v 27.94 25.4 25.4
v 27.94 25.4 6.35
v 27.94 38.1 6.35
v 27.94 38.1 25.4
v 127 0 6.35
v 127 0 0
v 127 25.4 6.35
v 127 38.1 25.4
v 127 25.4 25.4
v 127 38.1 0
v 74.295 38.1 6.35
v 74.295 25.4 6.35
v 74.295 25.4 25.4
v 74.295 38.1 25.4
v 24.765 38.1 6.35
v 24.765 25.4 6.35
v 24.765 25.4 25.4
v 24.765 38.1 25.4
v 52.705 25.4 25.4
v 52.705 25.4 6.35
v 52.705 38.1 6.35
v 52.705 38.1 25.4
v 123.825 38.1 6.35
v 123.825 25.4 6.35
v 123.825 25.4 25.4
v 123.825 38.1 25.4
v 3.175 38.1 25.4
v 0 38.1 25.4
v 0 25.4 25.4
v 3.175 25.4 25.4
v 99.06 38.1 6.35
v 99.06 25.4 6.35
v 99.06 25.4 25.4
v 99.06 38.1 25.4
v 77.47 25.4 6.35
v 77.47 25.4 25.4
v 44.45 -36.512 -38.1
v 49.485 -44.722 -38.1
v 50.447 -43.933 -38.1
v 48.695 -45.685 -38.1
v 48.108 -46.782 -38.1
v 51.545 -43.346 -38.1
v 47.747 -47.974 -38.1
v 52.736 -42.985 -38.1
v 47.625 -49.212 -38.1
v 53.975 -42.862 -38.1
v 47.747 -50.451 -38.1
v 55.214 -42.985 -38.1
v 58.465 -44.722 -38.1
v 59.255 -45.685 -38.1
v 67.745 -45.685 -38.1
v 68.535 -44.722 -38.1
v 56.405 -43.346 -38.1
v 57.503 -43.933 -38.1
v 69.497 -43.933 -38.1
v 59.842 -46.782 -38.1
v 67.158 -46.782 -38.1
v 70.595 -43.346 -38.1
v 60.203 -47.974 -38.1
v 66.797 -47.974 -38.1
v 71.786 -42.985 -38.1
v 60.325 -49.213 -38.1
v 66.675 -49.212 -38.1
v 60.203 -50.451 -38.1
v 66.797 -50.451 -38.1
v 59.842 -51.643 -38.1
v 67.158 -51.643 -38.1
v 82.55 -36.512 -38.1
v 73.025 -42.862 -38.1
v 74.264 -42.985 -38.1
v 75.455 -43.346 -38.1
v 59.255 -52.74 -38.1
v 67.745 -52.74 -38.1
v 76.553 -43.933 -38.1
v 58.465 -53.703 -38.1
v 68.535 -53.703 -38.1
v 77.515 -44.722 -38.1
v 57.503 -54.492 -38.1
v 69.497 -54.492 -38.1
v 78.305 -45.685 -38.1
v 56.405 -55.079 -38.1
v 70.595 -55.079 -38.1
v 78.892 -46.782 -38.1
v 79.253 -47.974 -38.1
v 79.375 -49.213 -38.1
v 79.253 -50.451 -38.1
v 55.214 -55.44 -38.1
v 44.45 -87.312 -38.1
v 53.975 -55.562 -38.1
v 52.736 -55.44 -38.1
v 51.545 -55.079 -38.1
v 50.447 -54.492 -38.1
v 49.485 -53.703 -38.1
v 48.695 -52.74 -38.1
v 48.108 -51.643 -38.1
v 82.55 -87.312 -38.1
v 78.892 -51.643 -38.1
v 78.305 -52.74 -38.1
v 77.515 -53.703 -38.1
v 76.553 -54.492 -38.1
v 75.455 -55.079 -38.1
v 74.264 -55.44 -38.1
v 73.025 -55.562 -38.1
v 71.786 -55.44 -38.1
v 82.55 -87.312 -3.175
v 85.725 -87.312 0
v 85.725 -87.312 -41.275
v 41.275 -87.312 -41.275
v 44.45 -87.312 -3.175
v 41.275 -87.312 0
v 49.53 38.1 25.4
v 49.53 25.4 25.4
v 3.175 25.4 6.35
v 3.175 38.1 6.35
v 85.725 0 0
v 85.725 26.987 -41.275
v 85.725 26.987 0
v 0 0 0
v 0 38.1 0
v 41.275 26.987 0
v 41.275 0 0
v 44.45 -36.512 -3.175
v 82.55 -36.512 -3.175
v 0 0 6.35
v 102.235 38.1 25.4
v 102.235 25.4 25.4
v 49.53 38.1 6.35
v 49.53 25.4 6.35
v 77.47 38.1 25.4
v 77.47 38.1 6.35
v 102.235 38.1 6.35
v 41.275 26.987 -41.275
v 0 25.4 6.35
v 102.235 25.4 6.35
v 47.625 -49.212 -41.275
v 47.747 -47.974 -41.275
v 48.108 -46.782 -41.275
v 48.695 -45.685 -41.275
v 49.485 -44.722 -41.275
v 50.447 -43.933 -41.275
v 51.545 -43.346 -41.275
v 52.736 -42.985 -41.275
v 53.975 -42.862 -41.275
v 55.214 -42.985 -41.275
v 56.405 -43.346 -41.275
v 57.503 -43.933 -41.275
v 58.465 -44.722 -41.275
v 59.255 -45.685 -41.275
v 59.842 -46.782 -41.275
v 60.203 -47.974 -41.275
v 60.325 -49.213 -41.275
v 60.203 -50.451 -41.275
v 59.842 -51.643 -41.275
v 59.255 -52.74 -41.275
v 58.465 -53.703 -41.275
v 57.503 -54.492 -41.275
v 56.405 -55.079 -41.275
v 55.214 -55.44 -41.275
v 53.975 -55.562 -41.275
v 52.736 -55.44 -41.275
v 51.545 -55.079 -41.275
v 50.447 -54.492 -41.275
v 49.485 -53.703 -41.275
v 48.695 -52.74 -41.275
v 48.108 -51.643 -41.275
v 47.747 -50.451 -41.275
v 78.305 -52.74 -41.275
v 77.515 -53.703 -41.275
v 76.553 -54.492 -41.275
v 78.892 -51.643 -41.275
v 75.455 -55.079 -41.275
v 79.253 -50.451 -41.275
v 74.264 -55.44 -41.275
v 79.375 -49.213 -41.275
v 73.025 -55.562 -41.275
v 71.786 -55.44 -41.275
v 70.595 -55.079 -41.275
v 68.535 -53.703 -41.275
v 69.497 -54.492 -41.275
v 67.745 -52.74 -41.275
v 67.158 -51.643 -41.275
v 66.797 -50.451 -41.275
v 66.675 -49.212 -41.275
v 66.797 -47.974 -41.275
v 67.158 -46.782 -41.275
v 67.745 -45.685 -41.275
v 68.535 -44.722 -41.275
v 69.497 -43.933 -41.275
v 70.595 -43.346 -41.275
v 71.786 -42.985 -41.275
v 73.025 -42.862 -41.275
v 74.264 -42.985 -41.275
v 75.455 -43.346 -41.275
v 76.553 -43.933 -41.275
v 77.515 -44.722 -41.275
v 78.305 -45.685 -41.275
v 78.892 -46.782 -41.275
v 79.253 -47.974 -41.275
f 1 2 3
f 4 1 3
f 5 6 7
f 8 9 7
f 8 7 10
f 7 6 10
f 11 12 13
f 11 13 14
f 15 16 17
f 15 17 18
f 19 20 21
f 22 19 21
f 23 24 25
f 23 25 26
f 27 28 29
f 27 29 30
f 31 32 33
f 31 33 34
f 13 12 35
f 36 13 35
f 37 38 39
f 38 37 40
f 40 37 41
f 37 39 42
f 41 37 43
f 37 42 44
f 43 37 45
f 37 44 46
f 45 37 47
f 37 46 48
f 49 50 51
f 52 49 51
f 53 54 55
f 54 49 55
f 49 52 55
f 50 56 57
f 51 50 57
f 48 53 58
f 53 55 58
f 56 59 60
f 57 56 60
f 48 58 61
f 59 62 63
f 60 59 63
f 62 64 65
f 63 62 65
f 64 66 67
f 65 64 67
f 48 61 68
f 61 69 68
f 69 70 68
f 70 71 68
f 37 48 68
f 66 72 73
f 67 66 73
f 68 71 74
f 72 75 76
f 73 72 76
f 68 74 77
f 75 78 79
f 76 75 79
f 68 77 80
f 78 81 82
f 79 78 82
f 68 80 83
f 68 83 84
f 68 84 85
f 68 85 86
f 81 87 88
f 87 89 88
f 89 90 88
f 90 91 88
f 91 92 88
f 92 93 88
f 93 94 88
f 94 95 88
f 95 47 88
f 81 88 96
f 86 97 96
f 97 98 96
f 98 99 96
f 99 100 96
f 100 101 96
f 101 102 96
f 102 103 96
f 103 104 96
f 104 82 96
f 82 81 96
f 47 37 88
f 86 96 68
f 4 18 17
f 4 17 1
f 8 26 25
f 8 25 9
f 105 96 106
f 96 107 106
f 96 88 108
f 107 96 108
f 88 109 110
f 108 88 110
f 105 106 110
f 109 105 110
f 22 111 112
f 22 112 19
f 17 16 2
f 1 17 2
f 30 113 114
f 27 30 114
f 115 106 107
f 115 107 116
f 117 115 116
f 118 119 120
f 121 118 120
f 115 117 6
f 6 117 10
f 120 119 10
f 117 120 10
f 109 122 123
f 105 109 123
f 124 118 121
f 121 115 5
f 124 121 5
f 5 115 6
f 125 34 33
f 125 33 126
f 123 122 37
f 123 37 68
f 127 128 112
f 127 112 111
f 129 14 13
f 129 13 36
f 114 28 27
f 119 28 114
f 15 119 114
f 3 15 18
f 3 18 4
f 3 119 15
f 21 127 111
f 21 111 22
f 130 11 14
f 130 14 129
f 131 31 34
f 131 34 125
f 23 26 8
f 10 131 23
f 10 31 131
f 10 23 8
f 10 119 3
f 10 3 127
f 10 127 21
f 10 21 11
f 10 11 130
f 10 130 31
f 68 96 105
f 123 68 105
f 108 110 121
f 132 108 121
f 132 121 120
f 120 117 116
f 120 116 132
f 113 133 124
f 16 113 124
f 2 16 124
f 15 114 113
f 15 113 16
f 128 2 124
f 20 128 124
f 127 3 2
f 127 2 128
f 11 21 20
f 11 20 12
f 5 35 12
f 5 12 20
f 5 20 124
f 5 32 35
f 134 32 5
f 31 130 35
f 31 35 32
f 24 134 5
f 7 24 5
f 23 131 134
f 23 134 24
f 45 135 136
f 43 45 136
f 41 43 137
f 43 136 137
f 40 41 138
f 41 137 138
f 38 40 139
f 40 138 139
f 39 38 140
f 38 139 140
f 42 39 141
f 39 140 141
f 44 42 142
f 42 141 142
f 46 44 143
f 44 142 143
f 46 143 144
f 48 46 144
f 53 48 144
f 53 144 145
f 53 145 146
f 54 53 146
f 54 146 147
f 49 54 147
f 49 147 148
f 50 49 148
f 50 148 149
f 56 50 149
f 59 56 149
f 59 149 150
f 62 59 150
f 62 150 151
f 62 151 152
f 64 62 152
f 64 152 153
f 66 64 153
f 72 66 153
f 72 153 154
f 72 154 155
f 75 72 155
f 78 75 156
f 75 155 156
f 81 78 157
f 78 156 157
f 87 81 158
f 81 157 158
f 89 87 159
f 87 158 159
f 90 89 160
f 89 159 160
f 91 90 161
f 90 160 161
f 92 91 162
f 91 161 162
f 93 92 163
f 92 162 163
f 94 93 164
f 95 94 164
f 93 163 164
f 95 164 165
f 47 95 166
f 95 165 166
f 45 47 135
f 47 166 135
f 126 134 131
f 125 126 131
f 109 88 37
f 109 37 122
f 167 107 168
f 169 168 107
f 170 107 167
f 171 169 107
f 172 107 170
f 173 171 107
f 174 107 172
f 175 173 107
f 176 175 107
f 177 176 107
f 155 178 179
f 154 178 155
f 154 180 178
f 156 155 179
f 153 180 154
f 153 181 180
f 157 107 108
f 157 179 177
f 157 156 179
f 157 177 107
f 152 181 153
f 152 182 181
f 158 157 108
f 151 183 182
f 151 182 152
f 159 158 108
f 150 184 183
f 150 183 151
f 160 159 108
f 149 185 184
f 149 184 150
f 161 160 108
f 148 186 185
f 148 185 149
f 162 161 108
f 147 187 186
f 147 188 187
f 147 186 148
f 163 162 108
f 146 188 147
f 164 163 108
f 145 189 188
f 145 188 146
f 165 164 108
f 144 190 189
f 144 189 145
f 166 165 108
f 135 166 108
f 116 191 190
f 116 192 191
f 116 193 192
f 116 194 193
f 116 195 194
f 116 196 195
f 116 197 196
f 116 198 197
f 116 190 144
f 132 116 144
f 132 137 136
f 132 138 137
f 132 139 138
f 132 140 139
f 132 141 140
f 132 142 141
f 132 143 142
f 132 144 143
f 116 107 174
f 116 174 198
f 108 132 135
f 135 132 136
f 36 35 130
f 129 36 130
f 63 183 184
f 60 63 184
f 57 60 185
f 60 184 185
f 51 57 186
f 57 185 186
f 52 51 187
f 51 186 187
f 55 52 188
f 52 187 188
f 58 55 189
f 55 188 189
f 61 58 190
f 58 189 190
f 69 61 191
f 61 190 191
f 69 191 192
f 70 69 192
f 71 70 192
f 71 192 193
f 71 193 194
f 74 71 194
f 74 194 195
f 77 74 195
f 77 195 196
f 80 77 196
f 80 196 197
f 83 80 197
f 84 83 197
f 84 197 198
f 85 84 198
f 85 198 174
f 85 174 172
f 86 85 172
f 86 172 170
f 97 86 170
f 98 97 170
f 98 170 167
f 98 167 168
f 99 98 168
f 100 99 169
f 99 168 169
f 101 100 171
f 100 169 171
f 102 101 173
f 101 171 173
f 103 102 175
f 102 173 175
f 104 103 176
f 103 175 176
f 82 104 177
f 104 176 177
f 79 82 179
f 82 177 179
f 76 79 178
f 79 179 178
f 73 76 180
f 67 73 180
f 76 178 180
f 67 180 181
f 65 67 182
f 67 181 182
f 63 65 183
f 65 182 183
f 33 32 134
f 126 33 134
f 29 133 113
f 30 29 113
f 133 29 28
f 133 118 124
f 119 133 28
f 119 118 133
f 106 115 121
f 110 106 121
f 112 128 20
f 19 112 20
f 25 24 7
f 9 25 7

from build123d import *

# Parameters (mm, degrees)
SKETCH1_W           = 127
SKETCH1_H           = 38.1
BOSS_EXTRUDE1_DEPTH = 6.35
SKETCH2_W           = 3.175
SKETCH2_H           = 12.7
BOSS_EXTRUDE2_DEPTH = 19.05
SKETCH3_W           = 44.45
SKETCH3_H           = 114.3
BOSS_EXTRUDE3_DEPTH = 41.275
SKETCH4_W           = 38.1
SKETCH4_H           = 34.925
CUT_EXTRUDE1_DEPTH  = 50.8
SKETCH5_R           = 6.35
CUT_EXTRUDE2_DEPTH  = 23.8125


with BuildPart() as part:
    # Sketch1 → Boss-Extrude1 (new body)
    with BuildSketch(Plane.XY):
        with Locations((63.5, 19.05)):
            Rectangle(SKETCH1_W, SKETCH1_H)
    extrude(amount=BOSS_EXTRUDE1_DEPTH)

    # Sketch2 → Boss-Extrude2 (add)
    with BuildSketch(Plane.XY.offset(6.35)):
        with Locations((26.3525, 31.75)):
            Rectangle(SKETCH2_W, SKETCH2_H)
        with Locations((1.5875, 31.75)):
            Rectangle(SKETCH2_W, SKETCH2_H)
        with Locations((51.1175, 31.75)):
            Rectangle(SKETCH2_W, SKETCH2_H)
        with Locations((75.8825, 31.75)):
            Rectangle(SKETCH2_W, SKETCH2_H)
        with Locations((100.6475, 31.75)):
            Rectangle(SKETCH2_W, SKETCH2_H)
        with Locations((125.4125, 31.75)):
            Rectangle(SKETCH2_W, SKETCH2_H)
    extrude(amount=BOSS_EXTRUDE2_DEPTH)

    # Sketch3 → Boss-Extrude3 (add)
    with BuildSketch(Plane(origin=(0, 0, 0), x_dir=(-1, 0, 0), z_dir=(0, 0, -1))):
        with Locations((-63.5, -30.1625)):
            Rectangle(SKETCH3_W, SKETCH3_H)
    extrude(amount=BOSS_EXTRUDE3_DEPTH)

    # Sketch4 → Cut-Extrude1 (cut)
    with BuildSketch(Plane.XZ.offset(87.3125)):
        with Locations((63.5, -20.6375)):
            Rectangle(SKETCH4_W, SKETCH4_H)
    extrude(amount=-CUT_EXTRUDE1_DEPTH, mode=Mode.SUBTRACT)

    # Sketch5 → Cut-Extrude2 (cut)
    with BuildSketch(Plane(origin=(0, 0, -41.275), x_dir=(-1, 0, 0), z_dir=(0, 0, -1))):
        with Locations((-73.025, -49.2125)):
            Circle(SKETCH5_R)
        with Locations((-53.975, -49.2125)):
            Circle(SKETCH5_R)
    extrude(amount=-CUT_EXTRUDE2_DEPTH, mode=Mode.SUBTRACT)


solid = part.part
